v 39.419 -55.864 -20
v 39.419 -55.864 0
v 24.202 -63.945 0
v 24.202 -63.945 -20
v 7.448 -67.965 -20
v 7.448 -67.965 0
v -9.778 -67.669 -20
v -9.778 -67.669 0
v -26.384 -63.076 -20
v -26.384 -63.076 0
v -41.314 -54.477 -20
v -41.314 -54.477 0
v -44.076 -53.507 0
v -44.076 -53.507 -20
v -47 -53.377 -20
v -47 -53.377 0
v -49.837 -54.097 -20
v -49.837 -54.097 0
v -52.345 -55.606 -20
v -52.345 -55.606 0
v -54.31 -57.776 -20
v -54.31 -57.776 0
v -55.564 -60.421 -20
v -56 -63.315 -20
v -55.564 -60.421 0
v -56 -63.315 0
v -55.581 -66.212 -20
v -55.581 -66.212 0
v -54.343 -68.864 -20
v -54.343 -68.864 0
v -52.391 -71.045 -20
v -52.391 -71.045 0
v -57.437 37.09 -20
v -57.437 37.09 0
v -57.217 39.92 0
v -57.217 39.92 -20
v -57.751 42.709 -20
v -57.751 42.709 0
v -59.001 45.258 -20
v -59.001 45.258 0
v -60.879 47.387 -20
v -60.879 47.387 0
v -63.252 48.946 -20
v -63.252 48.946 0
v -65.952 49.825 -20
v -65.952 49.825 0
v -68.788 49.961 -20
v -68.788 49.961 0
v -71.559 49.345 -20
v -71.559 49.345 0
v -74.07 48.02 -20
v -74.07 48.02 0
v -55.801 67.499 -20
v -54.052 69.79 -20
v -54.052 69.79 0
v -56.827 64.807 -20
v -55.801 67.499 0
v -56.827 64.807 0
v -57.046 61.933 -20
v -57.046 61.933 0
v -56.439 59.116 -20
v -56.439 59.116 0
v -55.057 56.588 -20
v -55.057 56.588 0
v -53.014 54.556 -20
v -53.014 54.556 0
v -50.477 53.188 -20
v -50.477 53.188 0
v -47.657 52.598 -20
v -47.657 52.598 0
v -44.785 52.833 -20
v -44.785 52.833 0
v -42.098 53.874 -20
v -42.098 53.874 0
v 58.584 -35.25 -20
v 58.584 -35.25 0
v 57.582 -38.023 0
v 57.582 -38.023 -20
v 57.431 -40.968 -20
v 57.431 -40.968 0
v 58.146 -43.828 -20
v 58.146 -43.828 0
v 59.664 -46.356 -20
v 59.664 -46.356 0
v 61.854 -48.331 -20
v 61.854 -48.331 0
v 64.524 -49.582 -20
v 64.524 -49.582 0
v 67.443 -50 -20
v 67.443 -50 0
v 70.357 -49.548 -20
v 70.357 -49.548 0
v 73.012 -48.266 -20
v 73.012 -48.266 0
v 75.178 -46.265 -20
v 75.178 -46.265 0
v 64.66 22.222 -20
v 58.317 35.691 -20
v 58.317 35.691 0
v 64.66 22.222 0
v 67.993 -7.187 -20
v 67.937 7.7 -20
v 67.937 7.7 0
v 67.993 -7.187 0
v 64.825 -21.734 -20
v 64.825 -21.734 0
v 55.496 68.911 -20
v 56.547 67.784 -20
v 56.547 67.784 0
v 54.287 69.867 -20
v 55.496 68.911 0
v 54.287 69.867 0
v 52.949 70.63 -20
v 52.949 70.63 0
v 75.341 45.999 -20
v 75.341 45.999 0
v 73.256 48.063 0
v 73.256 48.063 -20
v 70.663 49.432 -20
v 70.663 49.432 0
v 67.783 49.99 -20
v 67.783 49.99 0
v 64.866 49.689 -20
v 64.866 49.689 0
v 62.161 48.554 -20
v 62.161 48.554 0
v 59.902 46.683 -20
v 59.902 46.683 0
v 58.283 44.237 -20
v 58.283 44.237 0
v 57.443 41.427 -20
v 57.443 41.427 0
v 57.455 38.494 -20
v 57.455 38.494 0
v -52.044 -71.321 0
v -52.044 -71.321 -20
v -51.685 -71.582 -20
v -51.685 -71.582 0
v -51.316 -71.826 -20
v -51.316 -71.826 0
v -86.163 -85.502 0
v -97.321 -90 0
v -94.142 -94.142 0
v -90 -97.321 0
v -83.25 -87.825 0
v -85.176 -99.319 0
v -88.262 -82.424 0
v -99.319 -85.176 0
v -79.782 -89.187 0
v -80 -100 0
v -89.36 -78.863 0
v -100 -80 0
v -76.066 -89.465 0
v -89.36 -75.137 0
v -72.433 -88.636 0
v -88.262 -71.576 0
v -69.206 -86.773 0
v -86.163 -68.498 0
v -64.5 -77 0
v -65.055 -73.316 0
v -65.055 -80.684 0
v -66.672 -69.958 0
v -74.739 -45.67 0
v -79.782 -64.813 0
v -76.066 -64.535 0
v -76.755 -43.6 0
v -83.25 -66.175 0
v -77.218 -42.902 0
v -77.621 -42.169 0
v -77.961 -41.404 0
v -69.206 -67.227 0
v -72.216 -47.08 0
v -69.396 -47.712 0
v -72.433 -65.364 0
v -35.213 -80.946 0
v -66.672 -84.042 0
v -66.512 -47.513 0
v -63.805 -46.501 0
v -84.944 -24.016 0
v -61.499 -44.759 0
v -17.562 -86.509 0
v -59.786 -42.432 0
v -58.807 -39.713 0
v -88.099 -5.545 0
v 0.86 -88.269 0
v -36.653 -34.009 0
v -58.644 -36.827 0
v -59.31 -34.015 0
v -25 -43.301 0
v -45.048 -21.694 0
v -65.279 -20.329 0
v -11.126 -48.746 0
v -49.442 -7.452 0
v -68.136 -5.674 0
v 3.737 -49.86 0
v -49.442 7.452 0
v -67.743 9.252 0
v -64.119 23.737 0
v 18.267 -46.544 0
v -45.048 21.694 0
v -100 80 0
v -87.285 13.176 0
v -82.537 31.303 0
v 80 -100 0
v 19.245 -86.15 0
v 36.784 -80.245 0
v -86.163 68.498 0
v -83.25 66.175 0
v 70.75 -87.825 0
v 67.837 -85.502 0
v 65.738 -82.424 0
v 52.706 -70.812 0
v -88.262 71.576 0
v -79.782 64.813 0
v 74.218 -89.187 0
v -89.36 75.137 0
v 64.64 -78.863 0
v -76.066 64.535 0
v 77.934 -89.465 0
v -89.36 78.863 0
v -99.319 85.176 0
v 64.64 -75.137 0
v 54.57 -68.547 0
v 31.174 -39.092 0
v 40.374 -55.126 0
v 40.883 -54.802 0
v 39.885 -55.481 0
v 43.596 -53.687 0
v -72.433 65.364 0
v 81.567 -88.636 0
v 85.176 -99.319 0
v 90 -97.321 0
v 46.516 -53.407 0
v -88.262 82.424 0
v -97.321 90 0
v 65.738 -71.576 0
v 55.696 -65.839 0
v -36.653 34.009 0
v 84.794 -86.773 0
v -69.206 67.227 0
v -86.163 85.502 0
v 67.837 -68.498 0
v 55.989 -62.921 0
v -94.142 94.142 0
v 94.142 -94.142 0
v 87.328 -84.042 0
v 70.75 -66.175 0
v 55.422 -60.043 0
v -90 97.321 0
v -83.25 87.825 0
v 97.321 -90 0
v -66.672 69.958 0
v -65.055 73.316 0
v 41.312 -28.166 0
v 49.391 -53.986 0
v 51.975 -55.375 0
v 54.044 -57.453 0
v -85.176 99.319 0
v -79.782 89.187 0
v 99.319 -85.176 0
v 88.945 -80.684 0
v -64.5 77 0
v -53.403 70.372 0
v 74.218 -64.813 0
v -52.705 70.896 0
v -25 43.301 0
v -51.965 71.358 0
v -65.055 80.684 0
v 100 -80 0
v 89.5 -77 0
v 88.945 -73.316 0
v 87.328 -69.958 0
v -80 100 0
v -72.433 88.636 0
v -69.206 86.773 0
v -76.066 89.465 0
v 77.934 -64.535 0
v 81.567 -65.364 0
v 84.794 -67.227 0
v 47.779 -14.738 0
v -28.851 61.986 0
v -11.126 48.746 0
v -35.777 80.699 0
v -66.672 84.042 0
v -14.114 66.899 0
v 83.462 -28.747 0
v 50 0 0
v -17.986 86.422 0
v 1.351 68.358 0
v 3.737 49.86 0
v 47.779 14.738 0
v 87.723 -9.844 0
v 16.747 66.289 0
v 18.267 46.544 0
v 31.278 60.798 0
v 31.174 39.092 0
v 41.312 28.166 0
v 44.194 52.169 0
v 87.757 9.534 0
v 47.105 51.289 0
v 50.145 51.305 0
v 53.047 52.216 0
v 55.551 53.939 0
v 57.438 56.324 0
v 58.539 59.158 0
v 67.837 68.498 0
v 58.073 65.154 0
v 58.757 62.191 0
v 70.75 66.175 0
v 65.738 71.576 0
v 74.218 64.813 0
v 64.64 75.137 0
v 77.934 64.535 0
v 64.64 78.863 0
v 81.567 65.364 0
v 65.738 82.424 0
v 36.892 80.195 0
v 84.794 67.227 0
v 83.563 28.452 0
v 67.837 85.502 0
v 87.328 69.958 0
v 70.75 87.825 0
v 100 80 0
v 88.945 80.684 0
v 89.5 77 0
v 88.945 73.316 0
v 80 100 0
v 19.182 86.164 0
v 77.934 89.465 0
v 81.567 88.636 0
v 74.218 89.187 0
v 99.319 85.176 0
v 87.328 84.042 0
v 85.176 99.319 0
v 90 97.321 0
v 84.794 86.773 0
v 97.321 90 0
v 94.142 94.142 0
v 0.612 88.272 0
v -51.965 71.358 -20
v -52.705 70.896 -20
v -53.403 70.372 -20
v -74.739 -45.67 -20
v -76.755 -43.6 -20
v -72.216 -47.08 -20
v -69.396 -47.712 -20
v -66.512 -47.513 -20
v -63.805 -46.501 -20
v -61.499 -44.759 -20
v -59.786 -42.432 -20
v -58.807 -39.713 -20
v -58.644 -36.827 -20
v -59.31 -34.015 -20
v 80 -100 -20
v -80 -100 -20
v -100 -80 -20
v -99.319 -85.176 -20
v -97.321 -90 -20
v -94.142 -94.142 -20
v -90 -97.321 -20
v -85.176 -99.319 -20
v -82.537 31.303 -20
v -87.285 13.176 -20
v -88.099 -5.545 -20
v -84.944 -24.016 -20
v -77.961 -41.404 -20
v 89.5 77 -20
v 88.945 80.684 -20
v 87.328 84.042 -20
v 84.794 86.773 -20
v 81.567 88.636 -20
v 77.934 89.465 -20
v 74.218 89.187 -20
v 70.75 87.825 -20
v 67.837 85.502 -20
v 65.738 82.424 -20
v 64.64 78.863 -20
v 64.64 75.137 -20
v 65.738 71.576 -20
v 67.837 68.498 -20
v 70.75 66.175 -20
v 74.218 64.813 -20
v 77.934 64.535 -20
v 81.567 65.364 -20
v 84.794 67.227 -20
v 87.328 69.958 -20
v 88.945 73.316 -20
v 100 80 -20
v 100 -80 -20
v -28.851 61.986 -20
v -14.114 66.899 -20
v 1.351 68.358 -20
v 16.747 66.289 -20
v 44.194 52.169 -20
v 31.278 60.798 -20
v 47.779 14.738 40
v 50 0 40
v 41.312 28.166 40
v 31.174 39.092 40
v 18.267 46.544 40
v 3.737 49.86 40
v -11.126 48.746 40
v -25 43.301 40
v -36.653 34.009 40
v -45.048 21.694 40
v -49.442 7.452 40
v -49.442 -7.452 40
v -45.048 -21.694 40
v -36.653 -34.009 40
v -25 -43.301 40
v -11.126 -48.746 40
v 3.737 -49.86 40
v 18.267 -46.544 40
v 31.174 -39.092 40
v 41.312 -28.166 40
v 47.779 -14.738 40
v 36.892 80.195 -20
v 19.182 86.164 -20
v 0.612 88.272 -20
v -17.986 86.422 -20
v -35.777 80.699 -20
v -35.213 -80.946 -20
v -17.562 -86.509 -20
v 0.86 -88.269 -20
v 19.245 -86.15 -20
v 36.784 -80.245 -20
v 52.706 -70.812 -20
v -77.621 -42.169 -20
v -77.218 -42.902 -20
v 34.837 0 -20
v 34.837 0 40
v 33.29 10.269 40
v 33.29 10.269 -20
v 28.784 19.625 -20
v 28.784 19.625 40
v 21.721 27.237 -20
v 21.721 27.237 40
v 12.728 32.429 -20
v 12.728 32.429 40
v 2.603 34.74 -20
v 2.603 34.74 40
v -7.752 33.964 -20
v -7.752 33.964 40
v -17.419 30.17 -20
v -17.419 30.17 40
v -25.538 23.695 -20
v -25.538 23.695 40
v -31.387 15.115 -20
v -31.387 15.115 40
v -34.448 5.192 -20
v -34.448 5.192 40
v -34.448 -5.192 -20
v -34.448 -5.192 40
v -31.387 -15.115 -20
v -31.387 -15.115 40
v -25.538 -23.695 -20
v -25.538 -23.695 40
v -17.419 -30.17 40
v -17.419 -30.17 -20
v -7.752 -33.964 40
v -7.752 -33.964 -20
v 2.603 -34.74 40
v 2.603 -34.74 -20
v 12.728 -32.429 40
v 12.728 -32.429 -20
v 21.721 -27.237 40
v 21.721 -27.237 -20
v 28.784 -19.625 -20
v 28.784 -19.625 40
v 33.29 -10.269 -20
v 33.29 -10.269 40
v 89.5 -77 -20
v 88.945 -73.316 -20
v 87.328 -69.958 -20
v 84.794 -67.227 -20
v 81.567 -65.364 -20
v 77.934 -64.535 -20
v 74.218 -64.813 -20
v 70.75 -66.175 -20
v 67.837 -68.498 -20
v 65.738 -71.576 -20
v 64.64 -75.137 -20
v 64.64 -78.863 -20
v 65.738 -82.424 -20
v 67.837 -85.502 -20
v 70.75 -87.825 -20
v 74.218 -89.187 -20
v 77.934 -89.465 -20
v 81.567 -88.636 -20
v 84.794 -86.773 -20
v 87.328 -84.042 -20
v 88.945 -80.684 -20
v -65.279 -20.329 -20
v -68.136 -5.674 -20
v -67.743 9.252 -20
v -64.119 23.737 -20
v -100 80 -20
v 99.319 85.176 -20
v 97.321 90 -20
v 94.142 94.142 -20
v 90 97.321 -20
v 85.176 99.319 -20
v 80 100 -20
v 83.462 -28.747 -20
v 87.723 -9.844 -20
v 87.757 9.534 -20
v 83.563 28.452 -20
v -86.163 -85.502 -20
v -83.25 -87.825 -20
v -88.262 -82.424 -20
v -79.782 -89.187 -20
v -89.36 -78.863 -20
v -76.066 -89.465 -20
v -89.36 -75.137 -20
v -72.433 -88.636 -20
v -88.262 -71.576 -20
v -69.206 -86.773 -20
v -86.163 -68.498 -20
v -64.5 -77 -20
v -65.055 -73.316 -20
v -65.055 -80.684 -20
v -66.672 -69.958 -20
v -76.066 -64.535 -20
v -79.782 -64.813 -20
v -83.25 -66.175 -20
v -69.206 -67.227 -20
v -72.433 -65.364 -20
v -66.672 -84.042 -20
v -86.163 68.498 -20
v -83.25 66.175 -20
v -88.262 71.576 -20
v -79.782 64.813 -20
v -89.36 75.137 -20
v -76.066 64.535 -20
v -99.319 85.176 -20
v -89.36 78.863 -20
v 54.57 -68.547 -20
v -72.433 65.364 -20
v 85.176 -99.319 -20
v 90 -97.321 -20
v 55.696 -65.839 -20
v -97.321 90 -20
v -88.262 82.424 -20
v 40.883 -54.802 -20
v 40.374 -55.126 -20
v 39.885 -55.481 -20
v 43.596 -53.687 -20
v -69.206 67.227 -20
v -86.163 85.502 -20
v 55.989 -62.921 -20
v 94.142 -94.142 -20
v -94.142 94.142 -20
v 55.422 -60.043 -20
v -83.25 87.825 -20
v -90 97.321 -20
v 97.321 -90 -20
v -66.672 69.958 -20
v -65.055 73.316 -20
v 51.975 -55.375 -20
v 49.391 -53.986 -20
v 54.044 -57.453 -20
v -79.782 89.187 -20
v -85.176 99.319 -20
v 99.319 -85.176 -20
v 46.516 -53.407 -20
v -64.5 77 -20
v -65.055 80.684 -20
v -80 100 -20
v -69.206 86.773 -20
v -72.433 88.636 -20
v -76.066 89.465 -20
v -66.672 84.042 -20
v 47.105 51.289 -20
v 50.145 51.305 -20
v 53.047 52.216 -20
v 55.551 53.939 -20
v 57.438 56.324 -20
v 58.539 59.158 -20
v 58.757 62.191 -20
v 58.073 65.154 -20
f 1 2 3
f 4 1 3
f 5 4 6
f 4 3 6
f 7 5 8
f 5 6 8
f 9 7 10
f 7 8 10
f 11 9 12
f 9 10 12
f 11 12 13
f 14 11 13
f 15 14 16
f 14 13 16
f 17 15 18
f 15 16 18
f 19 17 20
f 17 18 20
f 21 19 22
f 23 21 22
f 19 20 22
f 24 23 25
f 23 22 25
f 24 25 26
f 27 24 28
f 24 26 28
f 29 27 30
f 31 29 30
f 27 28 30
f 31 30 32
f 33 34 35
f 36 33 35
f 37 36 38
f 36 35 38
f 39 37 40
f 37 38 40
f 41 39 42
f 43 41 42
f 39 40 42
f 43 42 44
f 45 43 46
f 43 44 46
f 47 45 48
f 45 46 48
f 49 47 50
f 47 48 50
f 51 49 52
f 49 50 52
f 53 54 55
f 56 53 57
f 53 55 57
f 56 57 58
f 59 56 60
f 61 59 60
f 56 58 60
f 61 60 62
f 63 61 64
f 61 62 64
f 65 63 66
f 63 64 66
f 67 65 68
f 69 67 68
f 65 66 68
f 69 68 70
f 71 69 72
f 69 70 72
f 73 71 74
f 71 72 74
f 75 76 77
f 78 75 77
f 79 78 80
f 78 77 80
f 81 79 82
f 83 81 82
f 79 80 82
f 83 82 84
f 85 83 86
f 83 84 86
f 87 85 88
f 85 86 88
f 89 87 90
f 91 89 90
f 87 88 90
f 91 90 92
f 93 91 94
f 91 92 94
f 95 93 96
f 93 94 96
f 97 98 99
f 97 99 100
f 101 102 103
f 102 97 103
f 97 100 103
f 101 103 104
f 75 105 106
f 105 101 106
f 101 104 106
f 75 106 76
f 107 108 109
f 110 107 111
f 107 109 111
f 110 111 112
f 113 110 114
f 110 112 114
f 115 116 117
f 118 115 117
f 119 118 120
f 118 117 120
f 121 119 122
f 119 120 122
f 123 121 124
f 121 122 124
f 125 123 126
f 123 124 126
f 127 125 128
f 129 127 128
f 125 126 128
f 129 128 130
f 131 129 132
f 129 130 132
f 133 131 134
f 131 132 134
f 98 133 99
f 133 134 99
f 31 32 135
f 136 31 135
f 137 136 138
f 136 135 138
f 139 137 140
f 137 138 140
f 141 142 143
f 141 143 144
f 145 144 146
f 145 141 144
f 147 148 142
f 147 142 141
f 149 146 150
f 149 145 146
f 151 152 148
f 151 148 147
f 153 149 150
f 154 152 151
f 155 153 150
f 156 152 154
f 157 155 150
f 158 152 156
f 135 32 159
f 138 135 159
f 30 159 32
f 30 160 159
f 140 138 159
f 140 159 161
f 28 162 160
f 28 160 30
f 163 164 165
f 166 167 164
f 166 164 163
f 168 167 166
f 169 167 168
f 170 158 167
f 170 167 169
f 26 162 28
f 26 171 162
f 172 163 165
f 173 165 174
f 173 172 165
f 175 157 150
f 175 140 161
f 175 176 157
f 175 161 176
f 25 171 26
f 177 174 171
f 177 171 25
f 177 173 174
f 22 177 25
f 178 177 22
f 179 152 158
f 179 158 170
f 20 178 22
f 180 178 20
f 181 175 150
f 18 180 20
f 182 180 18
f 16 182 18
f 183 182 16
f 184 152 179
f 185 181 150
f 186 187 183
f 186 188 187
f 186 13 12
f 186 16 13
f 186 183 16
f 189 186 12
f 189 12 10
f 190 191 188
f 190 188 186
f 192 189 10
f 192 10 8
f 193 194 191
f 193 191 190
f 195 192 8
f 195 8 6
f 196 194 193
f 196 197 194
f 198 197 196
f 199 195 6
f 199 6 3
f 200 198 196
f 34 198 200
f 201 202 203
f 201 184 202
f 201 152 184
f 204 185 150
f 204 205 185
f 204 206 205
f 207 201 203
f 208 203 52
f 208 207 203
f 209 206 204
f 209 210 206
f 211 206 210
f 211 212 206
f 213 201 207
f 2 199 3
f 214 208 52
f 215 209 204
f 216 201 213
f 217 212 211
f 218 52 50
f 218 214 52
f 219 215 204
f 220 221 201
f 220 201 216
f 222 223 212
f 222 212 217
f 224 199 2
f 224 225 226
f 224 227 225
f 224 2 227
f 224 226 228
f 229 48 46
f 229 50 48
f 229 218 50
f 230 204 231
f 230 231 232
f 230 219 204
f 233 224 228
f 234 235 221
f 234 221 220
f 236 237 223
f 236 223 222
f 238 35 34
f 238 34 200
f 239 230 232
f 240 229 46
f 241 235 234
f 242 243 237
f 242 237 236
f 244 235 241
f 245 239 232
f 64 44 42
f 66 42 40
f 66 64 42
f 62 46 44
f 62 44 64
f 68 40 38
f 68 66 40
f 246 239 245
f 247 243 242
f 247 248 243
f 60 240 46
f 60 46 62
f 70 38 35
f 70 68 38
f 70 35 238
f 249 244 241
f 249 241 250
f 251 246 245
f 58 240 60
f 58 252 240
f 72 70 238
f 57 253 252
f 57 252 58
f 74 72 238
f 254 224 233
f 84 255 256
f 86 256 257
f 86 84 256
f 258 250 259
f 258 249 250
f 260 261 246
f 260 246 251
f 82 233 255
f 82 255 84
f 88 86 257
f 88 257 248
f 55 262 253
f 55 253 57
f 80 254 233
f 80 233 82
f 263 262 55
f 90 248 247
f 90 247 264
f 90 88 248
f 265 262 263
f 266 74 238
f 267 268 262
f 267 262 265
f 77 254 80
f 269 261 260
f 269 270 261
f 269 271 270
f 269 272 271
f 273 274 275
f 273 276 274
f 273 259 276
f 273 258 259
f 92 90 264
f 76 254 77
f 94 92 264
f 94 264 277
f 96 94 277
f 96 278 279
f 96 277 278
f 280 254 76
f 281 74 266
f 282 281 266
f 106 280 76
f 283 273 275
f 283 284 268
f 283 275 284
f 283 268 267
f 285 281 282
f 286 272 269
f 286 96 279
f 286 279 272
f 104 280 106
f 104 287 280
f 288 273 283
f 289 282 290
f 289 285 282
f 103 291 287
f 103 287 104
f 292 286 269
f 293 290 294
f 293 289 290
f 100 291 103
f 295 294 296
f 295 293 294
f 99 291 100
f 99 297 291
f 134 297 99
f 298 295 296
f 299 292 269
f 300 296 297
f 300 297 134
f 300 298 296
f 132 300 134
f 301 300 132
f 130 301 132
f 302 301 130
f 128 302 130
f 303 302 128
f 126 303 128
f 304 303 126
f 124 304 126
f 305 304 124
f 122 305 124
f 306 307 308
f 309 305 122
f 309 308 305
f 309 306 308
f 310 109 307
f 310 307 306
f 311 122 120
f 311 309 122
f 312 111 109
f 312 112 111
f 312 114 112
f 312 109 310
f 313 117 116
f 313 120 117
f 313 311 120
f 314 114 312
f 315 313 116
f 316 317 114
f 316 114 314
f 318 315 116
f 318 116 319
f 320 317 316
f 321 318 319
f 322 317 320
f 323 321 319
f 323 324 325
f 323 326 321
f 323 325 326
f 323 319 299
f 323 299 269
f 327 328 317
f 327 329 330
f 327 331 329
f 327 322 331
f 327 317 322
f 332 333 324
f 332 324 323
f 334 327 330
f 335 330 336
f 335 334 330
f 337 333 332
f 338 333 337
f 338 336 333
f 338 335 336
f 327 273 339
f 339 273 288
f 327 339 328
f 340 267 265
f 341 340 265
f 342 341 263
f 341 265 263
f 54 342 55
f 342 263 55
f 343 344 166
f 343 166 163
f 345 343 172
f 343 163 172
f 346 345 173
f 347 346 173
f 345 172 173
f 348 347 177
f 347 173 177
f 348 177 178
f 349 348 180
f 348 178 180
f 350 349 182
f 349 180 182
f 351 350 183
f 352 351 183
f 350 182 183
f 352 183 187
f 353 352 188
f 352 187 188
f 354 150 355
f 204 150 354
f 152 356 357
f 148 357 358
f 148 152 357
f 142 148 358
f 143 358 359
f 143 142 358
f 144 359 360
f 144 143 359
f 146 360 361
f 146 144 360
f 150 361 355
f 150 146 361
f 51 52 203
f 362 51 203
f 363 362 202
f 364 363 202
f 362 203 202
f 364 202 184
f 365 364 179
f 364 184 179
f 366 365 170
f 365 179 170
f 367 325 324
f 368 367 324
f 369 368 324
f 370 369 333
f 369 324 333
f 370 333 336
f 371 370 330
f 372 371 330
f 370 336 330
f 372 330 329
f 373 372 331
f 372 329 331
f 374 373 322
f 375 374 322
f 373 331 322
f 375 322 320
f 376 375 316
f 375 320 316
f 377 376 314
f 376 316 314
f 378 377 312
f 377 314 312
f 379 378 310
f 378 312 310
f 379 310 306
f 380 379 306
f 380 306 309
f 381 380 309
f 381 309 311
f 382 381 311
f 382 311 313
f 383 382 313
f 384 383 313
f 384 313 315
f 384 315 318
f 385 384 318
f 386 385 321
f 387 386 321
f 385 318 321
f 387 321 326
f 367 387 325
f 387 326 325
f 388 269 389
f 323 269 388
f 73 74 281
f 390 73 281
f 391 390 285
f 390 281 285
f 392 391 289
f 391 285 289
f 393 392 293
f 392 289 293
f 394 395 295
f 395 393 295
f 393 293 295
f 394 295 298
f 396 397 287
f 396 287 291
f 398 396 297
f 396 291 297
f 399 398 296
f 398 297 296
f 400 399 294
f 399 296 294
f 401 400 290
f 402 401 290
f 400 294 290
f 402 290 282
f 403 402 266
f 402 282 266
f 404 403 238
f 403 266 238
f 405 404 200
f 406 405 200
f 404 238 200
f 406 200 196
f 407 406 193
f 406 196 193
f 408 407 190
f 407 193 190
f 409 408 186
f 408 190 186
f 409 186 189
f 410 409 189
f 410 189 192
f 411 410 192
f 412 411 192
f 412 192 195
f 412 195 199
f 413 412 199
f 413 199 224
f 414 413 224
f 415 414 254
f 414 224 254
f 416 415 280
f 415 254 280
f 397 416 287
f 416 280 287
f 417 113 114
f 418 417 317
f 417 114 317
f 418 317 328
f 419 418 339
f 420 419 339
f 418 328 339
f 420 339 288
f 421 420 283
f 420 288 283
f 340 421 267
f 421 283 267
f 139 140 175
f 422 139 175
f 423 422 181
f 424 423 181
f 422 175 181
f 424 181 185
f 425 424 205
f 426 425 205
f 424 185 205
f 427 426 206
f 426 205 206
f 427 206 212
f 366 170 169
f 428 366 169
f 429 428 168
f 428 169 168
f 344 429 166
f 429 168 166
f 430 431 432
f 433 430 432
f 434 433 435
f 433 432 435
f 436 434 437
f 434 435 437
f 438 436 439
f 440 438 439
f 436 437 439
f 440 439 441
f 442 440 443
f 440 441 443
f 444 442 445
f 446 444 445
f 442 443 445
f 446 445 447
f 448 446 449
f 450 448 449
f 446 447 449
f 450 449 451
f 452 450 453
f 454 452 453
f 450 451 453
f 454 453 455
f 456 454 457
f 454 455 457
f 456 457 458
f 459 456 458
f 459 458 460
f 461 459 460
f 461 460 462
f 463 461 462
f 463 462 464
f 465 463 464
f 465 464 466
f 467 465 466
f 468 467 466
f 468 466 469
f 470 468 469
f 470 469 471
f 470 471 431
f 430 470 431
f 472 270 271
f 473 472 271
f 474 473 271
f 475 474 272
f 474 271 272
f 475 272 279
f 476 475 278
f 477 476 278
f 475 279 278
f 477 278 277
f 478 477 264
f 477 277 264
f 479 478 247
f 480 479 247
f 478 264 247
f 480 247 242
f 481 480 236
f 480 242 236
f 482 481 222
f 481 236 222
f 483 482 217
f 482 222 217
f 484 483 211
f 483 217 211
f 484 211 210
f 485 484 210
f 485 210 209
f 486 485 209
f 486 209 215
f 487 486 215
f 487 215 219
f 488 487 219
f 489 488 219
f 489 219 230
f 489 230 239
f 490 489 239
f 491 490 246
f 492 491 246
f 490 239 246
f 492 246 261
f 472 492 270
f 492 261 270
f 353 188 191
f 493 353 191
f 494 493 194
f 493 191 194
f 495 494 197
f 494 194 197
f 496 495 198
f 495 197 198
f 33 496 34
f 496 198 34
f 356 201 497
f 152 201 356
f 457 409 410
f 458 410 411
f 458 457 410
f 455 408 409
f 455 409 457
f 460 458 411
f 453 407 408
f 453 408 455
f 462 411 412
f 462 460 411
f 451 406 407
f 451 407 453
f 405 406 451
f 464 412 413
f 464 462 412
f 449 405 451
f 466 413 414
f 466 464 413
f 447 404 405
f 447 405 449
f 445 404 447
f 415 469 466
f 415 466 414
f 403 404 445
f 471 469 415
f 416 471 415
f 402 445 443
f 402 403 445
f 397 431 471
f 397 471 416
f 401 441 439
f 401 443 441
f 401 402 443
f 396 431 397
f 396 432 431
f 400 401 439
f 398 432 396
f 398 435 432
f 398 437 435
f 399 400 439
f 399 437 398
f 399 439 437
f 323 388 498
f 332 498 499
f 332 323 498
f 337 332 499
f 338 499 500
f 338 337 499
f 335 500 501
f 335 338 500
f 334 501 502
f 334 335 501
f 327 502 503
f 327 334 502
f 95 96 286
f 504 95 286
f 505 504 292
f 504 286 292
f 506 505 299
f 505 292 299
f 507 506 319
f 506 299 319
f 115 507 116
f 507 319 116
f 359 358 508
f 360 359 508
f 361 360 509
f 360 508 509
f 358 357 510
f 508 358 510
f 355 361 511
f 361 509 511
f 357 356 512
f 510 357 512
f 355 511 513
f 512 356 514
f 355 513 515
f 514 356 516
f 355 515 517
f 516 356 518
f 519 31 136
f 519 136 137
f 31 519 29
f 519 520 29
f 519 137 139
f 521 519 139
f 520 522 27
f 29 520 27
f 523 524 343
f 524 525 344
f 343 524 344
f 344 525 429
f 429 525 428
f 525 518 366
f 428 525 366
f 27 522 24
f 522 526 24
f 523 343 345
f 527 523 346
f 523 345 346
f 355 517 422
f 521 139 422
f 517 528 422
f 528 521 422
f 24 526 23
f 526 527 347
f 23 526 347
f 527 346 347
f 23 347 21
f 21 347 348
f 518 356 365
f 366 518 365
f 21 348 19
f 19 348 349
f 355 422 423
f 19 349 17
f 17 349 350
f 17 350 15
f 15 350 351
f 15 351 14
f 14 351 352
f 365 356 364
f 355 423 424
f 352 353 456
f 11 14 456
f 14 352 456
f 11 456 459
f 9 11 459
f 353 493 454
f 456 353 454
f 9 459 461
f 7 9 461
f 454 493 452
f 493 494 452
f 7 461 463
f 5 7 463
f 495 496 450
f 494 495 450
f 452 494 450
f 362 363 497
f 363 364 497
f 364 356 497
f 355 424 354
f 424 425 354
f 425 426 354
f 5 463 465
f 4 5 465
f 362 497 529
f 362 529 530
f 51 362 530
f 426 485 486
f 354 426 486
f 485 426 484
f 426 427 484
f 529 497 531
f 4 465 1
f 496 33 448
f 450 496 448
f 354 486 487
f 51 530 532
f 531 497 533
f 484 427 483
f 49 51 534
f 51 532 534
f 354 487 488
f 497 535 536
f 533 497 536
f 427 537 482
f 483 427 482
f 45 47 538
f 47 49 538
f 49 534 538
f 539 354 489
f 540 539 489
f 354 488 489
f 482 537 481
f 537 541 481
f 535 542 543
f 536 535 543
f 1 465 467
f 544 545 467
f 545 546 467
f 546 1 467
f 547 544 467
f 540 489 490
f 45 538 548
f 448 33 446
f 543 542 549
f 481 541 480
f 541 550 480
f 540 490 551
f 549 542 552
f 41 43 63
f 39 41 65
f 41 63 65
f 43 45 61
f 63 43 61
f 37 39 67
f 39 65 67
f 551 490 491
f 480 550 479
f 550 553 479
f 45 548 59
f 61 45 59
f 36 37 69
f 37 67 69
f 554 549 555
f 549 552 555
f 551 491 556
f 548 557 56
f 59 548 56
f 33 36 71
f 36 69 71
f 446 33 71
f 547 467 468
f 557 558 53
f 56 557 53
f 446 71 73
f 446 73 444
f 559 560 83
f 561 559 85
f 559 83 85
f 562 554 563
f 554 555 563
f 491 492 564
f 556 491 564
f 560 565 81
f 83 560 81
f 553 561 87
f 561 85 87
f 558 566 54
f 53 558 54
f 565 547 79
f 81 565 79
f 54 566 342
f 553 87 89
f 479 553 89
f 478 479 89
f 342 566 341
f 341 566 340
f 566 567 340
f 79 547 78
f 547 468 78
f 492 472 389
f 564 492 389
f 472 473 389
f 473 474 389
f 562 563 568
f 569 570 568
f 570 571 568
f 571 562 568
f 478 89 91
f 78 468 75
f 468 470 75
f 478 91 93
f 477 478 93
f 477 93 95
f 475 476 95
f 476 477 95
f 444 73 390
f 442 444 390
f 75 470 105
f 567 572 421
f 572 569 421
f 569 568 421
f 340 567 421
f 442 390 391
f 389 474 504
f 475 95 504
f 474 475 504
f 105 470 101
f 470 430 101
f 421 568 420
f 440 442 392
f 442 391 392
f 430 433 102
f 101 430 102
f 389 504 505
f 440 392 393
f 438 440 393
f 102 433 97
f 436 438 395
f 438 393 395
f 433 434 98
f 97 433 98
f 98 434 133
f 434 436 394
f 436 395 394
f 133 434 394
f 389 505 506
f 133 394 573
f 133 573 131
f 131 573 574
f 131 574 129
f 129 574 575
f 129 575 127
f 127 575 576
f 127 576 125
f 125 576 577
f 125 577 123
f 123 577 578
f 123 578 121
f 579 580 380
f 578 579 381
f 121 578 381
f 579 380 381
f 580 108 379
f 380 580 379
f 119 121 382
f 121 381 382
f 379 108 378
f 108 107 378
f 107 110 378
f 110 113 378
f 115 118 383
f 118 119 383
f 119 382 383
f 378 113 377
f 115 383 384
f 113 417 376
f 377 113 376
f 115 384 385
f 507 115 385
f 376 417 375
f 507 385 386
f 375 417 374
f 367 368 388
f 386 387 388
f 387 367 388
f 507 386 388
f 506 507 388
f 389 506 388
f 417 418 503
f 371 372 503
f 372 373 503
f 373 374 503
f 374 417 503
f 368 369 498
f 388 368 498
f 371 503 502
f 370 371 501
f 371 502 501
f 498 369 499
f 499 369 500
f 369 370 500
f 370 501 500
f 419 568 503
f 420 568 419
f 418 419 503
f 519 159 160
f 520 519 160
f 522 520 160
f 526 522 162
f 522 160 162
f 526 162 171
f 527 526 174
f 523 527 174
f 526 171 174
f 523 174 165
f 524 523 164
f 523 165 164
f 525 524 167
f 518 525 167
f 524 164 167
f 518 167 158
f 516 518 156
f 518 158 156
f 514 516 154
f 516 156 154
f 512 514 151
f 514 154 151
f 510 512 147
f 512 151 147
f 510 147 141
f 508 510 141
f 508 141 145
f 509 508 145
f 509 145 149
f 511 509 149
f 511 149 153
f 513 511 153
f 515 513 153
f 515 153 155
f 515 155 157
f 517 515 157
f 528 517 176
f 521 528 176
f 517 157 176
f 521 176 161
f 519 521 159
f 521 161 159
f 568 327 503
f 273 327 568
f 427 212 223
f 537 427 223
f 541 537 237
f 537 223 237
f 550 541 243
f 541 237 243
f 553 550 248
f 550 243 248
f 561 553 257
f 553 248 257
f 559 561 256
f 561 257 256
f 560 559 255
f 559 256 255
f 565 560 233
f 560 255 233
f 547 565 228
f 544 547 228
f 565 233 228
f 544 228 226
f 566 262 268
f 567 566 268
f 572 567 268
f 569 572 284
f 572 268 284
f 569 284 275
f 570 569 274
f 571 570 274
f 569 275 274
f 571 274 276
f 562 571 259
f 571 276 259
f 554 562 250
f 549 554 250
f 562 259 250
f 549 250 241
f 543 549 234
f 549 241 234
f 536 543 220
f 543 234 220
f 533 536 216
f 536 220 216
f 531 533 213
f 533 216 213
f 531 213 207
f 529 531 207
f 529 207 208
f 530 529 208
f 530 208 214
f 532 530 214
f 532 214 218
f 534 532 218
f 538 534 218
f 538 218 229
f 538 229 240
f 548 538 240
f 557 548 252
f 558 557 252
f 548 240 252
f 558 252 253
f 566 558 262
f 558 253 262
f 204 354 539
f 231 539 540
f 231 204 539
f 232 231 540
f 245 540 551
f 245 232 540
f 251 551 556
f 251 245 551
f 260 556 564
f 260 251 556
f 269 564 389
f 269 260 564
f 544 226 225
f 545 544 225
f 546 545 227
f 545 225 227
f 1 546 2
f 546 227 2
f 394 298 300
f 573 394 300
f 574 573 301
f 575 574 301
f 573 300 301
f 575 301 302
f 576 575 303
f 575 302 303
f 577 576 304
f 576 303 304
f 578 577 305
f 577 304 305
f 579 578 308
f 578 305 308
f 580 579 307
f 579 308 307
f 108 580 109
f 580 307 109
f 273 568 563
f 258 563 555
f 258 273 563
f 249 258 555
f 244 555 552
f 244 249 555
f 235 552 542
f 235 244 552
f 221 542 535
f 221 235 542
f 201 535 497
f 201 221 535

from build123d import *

# Parameters (mm, degrees)
F0_R     = 12.5
F1_DEPTH = 20
F2_R     = 50
F3_DEPTH = 40
F4_R     = 34.837403
F5_DEPTH = 100
F7_DEPTH = 25


with BuildPart() as f1:
    # F0 (on Top) → F1 (new body)
    with BuildSketch(Plane.XY):
        with BuildLine():
            ThreePointArc((100, 80), (94.142136, 94.142136), (80, 100))
            Line((80, 100), (-80, 100))
            ThreePointArc((-80, 100), (-94.142136, 94.142136), (-100, 80))
            Line((-100, 80), (-100, -80))
            ThreePointArc((-100, -80), (-94.142136, -94.142136), (-80, -100))
            Line((-80, -100), (80, -100))
            ThreePointArc((80, -100), (94.142136, -94.142136), (100, -80))
            Line((100, -80), (100, 80))
        make_face()
        with Locations((-77, -77)):
            Circle(F0_R, mode=Mode.SUBTRACT)
        with Locations((77, -77)):
            Circle(F0_R, mode=Mode.SUBTRACT)
        with Locations((-77, 77)):
            Circle(F0_R, mode=Mode.SUBTRACT)
        with Locations((77, 77)):
            Circle(F0_R, mode=Mode.SUBTRACT)
    extrude(amount=-F1_DEPTH)

    # F2 (on face) → F3 (join)
    with BuildSketch(Plane.XY):
        Circle(F2_R)
    extrude(amount=F3_DEPTH)

    # F4 (on face) → F5 (cut)
    with BuildSketch(Plane.XY.offset(40)):
        Circle(F4_R)
    extrude(amount=-F5_DEPTH, mode=Mode.SUBTRACT)

    # F6 (on Top) → F7 (cut)
    with BuildSketch(Plane.XY):
        with BuildLine():
            ThreePointArc((-59.309852, -34.015045), (-68.347947, 1.800006), (-57.437243, 37.089687))
            ThreePointArc((-57.437243, 37.089687), (-62.013533, 48.246062), (-74.069896, 48.019696))
            ThreePointArc((-74.069896, 48.019696), (-88.19022, 3.83743), (-77.961014, -41.40436))
            ThreePointArc((-77.961014, -41.40436), (-77.365723, -42.506301), (-76.754857, -43.599686))
            ThreePointArc((-76.754857, -43.599686), (-63.805315, -46.501), (-59.309852, -34.015045))
        make_face()
        with BuildLine():
            ThreePointArc((-77.961014, -41.40436), (-77.426731, -42.53982), (-76.754857, -43.599686))
            ThreePointArc((-76.754857, -43.599686), (-77.365723, -42.506301), (-77.961014, -41.40436))
        make_face()
        with BuildLine():
            ThreePointArc((-54.052199, 69.789687), (-53.014186, 70.58142), (-51.964577, 71.357714))
            ThreePointArc((-51.964577, 71.357714), (-53.059588, 70.641867), (-54.052199, 69.789687))
        make_face()
        with BuildLine():
            ThreePointArc((52.94881, 70.630476), (0.61188, 88.271549), (-51.964577, 71.357714))
            ThreePointArc((-51.964577, 71.357714), (-53.014186, 70.58142), (-54.052199, 69.789687))
            ThreePointArc((-54.052199, 69.789687), (-55.057173, 56.587711), (-42.098027, 53.874279))
            ThreePointArc((-42.098027, 53.874279), (1.351238, 68.358291), (44.194175, 52.168541))
            ThreePointArc((44.194175, 52.168541), (56.583811, 55.06118), (56.54711, 67.783959))
            ThreePointArc((56.54711, 67.783959), (54.766457, 69.230599), (52.94881, 70.630476))
        make_face()
        with BuildLine():
            ThreePointArc((56.54711, 67.783959), (54.909822, 69.411828), (52.94881, 70.630476))
            ThreePointArc((52.94881, 70.630476), (54.766457, 69.230599), (56.54711, 67.783959))
        make_face()
        with BuildLine():
            ThreePointArc((39.419032, -55.864315), (-1.174312, -68.361559), (-41.314479, -54.477479))
            ThreePointArc((-41.314479, -54.477479), (-54.310003, -57.775947), (-52.39069, -71.045453))
            ThreePointArc((-52.39069, -71.045453), (-51.854665, -71.437626), (-51.315704, -71.825756))
            ThreePointArc((-51.315704, -71.825756), (0.860325, -88.269477), (52.705932, -70.811902))
            ThreePointArc((52.705932, -70.811902), (54.044321, -57.453202), (40.883132, -54.801928))
            ThreePointArc((40.883132, -54.801928), (40.154596, -55.337964), (39.419032, -55.864315))
        make_face()
        with BuildLine():
            ThreePointArc((-51.315704, -71.825756), (-51.854665, -71.437626), (-52.39069, -71.045453))
            ThreePointArc((-52.39069, -71.045453), (-51.866142, -71.453438), (-51.315704, -71.825756))
        make_face()
        with BuildLine():
            ThreePointArc((40.883132, -54.801928), (40.12701, -55.299948), (39.419032, -55.864315))
            ThreePointArc((39.419032, -55.864315), (40.154596, -55.337964), (40.883132, -54.801928))
        make_face()
        with BuildLine():
            ThreePointArc((75.178414, -46.264963), (88.273532, -0.155791), (75.341248, 45.999316))
            ThreePointArc((75.341248, 45.999316), (62.161005, 48.55397), (58.316969, 35.690517))
            ThreePointArc((58.316969, 35.690517), (68.371159, 0.257823), (58.58448, -35.249689))
            ThreePointArc((58.58448, -35.249689), (61.853637, -48.331459), (75.178414, -46.264963))
        make_face()
    extrude(amount=-F7_DEPTH, mode=Mode.SUBTRACT)


solid = f1.part
